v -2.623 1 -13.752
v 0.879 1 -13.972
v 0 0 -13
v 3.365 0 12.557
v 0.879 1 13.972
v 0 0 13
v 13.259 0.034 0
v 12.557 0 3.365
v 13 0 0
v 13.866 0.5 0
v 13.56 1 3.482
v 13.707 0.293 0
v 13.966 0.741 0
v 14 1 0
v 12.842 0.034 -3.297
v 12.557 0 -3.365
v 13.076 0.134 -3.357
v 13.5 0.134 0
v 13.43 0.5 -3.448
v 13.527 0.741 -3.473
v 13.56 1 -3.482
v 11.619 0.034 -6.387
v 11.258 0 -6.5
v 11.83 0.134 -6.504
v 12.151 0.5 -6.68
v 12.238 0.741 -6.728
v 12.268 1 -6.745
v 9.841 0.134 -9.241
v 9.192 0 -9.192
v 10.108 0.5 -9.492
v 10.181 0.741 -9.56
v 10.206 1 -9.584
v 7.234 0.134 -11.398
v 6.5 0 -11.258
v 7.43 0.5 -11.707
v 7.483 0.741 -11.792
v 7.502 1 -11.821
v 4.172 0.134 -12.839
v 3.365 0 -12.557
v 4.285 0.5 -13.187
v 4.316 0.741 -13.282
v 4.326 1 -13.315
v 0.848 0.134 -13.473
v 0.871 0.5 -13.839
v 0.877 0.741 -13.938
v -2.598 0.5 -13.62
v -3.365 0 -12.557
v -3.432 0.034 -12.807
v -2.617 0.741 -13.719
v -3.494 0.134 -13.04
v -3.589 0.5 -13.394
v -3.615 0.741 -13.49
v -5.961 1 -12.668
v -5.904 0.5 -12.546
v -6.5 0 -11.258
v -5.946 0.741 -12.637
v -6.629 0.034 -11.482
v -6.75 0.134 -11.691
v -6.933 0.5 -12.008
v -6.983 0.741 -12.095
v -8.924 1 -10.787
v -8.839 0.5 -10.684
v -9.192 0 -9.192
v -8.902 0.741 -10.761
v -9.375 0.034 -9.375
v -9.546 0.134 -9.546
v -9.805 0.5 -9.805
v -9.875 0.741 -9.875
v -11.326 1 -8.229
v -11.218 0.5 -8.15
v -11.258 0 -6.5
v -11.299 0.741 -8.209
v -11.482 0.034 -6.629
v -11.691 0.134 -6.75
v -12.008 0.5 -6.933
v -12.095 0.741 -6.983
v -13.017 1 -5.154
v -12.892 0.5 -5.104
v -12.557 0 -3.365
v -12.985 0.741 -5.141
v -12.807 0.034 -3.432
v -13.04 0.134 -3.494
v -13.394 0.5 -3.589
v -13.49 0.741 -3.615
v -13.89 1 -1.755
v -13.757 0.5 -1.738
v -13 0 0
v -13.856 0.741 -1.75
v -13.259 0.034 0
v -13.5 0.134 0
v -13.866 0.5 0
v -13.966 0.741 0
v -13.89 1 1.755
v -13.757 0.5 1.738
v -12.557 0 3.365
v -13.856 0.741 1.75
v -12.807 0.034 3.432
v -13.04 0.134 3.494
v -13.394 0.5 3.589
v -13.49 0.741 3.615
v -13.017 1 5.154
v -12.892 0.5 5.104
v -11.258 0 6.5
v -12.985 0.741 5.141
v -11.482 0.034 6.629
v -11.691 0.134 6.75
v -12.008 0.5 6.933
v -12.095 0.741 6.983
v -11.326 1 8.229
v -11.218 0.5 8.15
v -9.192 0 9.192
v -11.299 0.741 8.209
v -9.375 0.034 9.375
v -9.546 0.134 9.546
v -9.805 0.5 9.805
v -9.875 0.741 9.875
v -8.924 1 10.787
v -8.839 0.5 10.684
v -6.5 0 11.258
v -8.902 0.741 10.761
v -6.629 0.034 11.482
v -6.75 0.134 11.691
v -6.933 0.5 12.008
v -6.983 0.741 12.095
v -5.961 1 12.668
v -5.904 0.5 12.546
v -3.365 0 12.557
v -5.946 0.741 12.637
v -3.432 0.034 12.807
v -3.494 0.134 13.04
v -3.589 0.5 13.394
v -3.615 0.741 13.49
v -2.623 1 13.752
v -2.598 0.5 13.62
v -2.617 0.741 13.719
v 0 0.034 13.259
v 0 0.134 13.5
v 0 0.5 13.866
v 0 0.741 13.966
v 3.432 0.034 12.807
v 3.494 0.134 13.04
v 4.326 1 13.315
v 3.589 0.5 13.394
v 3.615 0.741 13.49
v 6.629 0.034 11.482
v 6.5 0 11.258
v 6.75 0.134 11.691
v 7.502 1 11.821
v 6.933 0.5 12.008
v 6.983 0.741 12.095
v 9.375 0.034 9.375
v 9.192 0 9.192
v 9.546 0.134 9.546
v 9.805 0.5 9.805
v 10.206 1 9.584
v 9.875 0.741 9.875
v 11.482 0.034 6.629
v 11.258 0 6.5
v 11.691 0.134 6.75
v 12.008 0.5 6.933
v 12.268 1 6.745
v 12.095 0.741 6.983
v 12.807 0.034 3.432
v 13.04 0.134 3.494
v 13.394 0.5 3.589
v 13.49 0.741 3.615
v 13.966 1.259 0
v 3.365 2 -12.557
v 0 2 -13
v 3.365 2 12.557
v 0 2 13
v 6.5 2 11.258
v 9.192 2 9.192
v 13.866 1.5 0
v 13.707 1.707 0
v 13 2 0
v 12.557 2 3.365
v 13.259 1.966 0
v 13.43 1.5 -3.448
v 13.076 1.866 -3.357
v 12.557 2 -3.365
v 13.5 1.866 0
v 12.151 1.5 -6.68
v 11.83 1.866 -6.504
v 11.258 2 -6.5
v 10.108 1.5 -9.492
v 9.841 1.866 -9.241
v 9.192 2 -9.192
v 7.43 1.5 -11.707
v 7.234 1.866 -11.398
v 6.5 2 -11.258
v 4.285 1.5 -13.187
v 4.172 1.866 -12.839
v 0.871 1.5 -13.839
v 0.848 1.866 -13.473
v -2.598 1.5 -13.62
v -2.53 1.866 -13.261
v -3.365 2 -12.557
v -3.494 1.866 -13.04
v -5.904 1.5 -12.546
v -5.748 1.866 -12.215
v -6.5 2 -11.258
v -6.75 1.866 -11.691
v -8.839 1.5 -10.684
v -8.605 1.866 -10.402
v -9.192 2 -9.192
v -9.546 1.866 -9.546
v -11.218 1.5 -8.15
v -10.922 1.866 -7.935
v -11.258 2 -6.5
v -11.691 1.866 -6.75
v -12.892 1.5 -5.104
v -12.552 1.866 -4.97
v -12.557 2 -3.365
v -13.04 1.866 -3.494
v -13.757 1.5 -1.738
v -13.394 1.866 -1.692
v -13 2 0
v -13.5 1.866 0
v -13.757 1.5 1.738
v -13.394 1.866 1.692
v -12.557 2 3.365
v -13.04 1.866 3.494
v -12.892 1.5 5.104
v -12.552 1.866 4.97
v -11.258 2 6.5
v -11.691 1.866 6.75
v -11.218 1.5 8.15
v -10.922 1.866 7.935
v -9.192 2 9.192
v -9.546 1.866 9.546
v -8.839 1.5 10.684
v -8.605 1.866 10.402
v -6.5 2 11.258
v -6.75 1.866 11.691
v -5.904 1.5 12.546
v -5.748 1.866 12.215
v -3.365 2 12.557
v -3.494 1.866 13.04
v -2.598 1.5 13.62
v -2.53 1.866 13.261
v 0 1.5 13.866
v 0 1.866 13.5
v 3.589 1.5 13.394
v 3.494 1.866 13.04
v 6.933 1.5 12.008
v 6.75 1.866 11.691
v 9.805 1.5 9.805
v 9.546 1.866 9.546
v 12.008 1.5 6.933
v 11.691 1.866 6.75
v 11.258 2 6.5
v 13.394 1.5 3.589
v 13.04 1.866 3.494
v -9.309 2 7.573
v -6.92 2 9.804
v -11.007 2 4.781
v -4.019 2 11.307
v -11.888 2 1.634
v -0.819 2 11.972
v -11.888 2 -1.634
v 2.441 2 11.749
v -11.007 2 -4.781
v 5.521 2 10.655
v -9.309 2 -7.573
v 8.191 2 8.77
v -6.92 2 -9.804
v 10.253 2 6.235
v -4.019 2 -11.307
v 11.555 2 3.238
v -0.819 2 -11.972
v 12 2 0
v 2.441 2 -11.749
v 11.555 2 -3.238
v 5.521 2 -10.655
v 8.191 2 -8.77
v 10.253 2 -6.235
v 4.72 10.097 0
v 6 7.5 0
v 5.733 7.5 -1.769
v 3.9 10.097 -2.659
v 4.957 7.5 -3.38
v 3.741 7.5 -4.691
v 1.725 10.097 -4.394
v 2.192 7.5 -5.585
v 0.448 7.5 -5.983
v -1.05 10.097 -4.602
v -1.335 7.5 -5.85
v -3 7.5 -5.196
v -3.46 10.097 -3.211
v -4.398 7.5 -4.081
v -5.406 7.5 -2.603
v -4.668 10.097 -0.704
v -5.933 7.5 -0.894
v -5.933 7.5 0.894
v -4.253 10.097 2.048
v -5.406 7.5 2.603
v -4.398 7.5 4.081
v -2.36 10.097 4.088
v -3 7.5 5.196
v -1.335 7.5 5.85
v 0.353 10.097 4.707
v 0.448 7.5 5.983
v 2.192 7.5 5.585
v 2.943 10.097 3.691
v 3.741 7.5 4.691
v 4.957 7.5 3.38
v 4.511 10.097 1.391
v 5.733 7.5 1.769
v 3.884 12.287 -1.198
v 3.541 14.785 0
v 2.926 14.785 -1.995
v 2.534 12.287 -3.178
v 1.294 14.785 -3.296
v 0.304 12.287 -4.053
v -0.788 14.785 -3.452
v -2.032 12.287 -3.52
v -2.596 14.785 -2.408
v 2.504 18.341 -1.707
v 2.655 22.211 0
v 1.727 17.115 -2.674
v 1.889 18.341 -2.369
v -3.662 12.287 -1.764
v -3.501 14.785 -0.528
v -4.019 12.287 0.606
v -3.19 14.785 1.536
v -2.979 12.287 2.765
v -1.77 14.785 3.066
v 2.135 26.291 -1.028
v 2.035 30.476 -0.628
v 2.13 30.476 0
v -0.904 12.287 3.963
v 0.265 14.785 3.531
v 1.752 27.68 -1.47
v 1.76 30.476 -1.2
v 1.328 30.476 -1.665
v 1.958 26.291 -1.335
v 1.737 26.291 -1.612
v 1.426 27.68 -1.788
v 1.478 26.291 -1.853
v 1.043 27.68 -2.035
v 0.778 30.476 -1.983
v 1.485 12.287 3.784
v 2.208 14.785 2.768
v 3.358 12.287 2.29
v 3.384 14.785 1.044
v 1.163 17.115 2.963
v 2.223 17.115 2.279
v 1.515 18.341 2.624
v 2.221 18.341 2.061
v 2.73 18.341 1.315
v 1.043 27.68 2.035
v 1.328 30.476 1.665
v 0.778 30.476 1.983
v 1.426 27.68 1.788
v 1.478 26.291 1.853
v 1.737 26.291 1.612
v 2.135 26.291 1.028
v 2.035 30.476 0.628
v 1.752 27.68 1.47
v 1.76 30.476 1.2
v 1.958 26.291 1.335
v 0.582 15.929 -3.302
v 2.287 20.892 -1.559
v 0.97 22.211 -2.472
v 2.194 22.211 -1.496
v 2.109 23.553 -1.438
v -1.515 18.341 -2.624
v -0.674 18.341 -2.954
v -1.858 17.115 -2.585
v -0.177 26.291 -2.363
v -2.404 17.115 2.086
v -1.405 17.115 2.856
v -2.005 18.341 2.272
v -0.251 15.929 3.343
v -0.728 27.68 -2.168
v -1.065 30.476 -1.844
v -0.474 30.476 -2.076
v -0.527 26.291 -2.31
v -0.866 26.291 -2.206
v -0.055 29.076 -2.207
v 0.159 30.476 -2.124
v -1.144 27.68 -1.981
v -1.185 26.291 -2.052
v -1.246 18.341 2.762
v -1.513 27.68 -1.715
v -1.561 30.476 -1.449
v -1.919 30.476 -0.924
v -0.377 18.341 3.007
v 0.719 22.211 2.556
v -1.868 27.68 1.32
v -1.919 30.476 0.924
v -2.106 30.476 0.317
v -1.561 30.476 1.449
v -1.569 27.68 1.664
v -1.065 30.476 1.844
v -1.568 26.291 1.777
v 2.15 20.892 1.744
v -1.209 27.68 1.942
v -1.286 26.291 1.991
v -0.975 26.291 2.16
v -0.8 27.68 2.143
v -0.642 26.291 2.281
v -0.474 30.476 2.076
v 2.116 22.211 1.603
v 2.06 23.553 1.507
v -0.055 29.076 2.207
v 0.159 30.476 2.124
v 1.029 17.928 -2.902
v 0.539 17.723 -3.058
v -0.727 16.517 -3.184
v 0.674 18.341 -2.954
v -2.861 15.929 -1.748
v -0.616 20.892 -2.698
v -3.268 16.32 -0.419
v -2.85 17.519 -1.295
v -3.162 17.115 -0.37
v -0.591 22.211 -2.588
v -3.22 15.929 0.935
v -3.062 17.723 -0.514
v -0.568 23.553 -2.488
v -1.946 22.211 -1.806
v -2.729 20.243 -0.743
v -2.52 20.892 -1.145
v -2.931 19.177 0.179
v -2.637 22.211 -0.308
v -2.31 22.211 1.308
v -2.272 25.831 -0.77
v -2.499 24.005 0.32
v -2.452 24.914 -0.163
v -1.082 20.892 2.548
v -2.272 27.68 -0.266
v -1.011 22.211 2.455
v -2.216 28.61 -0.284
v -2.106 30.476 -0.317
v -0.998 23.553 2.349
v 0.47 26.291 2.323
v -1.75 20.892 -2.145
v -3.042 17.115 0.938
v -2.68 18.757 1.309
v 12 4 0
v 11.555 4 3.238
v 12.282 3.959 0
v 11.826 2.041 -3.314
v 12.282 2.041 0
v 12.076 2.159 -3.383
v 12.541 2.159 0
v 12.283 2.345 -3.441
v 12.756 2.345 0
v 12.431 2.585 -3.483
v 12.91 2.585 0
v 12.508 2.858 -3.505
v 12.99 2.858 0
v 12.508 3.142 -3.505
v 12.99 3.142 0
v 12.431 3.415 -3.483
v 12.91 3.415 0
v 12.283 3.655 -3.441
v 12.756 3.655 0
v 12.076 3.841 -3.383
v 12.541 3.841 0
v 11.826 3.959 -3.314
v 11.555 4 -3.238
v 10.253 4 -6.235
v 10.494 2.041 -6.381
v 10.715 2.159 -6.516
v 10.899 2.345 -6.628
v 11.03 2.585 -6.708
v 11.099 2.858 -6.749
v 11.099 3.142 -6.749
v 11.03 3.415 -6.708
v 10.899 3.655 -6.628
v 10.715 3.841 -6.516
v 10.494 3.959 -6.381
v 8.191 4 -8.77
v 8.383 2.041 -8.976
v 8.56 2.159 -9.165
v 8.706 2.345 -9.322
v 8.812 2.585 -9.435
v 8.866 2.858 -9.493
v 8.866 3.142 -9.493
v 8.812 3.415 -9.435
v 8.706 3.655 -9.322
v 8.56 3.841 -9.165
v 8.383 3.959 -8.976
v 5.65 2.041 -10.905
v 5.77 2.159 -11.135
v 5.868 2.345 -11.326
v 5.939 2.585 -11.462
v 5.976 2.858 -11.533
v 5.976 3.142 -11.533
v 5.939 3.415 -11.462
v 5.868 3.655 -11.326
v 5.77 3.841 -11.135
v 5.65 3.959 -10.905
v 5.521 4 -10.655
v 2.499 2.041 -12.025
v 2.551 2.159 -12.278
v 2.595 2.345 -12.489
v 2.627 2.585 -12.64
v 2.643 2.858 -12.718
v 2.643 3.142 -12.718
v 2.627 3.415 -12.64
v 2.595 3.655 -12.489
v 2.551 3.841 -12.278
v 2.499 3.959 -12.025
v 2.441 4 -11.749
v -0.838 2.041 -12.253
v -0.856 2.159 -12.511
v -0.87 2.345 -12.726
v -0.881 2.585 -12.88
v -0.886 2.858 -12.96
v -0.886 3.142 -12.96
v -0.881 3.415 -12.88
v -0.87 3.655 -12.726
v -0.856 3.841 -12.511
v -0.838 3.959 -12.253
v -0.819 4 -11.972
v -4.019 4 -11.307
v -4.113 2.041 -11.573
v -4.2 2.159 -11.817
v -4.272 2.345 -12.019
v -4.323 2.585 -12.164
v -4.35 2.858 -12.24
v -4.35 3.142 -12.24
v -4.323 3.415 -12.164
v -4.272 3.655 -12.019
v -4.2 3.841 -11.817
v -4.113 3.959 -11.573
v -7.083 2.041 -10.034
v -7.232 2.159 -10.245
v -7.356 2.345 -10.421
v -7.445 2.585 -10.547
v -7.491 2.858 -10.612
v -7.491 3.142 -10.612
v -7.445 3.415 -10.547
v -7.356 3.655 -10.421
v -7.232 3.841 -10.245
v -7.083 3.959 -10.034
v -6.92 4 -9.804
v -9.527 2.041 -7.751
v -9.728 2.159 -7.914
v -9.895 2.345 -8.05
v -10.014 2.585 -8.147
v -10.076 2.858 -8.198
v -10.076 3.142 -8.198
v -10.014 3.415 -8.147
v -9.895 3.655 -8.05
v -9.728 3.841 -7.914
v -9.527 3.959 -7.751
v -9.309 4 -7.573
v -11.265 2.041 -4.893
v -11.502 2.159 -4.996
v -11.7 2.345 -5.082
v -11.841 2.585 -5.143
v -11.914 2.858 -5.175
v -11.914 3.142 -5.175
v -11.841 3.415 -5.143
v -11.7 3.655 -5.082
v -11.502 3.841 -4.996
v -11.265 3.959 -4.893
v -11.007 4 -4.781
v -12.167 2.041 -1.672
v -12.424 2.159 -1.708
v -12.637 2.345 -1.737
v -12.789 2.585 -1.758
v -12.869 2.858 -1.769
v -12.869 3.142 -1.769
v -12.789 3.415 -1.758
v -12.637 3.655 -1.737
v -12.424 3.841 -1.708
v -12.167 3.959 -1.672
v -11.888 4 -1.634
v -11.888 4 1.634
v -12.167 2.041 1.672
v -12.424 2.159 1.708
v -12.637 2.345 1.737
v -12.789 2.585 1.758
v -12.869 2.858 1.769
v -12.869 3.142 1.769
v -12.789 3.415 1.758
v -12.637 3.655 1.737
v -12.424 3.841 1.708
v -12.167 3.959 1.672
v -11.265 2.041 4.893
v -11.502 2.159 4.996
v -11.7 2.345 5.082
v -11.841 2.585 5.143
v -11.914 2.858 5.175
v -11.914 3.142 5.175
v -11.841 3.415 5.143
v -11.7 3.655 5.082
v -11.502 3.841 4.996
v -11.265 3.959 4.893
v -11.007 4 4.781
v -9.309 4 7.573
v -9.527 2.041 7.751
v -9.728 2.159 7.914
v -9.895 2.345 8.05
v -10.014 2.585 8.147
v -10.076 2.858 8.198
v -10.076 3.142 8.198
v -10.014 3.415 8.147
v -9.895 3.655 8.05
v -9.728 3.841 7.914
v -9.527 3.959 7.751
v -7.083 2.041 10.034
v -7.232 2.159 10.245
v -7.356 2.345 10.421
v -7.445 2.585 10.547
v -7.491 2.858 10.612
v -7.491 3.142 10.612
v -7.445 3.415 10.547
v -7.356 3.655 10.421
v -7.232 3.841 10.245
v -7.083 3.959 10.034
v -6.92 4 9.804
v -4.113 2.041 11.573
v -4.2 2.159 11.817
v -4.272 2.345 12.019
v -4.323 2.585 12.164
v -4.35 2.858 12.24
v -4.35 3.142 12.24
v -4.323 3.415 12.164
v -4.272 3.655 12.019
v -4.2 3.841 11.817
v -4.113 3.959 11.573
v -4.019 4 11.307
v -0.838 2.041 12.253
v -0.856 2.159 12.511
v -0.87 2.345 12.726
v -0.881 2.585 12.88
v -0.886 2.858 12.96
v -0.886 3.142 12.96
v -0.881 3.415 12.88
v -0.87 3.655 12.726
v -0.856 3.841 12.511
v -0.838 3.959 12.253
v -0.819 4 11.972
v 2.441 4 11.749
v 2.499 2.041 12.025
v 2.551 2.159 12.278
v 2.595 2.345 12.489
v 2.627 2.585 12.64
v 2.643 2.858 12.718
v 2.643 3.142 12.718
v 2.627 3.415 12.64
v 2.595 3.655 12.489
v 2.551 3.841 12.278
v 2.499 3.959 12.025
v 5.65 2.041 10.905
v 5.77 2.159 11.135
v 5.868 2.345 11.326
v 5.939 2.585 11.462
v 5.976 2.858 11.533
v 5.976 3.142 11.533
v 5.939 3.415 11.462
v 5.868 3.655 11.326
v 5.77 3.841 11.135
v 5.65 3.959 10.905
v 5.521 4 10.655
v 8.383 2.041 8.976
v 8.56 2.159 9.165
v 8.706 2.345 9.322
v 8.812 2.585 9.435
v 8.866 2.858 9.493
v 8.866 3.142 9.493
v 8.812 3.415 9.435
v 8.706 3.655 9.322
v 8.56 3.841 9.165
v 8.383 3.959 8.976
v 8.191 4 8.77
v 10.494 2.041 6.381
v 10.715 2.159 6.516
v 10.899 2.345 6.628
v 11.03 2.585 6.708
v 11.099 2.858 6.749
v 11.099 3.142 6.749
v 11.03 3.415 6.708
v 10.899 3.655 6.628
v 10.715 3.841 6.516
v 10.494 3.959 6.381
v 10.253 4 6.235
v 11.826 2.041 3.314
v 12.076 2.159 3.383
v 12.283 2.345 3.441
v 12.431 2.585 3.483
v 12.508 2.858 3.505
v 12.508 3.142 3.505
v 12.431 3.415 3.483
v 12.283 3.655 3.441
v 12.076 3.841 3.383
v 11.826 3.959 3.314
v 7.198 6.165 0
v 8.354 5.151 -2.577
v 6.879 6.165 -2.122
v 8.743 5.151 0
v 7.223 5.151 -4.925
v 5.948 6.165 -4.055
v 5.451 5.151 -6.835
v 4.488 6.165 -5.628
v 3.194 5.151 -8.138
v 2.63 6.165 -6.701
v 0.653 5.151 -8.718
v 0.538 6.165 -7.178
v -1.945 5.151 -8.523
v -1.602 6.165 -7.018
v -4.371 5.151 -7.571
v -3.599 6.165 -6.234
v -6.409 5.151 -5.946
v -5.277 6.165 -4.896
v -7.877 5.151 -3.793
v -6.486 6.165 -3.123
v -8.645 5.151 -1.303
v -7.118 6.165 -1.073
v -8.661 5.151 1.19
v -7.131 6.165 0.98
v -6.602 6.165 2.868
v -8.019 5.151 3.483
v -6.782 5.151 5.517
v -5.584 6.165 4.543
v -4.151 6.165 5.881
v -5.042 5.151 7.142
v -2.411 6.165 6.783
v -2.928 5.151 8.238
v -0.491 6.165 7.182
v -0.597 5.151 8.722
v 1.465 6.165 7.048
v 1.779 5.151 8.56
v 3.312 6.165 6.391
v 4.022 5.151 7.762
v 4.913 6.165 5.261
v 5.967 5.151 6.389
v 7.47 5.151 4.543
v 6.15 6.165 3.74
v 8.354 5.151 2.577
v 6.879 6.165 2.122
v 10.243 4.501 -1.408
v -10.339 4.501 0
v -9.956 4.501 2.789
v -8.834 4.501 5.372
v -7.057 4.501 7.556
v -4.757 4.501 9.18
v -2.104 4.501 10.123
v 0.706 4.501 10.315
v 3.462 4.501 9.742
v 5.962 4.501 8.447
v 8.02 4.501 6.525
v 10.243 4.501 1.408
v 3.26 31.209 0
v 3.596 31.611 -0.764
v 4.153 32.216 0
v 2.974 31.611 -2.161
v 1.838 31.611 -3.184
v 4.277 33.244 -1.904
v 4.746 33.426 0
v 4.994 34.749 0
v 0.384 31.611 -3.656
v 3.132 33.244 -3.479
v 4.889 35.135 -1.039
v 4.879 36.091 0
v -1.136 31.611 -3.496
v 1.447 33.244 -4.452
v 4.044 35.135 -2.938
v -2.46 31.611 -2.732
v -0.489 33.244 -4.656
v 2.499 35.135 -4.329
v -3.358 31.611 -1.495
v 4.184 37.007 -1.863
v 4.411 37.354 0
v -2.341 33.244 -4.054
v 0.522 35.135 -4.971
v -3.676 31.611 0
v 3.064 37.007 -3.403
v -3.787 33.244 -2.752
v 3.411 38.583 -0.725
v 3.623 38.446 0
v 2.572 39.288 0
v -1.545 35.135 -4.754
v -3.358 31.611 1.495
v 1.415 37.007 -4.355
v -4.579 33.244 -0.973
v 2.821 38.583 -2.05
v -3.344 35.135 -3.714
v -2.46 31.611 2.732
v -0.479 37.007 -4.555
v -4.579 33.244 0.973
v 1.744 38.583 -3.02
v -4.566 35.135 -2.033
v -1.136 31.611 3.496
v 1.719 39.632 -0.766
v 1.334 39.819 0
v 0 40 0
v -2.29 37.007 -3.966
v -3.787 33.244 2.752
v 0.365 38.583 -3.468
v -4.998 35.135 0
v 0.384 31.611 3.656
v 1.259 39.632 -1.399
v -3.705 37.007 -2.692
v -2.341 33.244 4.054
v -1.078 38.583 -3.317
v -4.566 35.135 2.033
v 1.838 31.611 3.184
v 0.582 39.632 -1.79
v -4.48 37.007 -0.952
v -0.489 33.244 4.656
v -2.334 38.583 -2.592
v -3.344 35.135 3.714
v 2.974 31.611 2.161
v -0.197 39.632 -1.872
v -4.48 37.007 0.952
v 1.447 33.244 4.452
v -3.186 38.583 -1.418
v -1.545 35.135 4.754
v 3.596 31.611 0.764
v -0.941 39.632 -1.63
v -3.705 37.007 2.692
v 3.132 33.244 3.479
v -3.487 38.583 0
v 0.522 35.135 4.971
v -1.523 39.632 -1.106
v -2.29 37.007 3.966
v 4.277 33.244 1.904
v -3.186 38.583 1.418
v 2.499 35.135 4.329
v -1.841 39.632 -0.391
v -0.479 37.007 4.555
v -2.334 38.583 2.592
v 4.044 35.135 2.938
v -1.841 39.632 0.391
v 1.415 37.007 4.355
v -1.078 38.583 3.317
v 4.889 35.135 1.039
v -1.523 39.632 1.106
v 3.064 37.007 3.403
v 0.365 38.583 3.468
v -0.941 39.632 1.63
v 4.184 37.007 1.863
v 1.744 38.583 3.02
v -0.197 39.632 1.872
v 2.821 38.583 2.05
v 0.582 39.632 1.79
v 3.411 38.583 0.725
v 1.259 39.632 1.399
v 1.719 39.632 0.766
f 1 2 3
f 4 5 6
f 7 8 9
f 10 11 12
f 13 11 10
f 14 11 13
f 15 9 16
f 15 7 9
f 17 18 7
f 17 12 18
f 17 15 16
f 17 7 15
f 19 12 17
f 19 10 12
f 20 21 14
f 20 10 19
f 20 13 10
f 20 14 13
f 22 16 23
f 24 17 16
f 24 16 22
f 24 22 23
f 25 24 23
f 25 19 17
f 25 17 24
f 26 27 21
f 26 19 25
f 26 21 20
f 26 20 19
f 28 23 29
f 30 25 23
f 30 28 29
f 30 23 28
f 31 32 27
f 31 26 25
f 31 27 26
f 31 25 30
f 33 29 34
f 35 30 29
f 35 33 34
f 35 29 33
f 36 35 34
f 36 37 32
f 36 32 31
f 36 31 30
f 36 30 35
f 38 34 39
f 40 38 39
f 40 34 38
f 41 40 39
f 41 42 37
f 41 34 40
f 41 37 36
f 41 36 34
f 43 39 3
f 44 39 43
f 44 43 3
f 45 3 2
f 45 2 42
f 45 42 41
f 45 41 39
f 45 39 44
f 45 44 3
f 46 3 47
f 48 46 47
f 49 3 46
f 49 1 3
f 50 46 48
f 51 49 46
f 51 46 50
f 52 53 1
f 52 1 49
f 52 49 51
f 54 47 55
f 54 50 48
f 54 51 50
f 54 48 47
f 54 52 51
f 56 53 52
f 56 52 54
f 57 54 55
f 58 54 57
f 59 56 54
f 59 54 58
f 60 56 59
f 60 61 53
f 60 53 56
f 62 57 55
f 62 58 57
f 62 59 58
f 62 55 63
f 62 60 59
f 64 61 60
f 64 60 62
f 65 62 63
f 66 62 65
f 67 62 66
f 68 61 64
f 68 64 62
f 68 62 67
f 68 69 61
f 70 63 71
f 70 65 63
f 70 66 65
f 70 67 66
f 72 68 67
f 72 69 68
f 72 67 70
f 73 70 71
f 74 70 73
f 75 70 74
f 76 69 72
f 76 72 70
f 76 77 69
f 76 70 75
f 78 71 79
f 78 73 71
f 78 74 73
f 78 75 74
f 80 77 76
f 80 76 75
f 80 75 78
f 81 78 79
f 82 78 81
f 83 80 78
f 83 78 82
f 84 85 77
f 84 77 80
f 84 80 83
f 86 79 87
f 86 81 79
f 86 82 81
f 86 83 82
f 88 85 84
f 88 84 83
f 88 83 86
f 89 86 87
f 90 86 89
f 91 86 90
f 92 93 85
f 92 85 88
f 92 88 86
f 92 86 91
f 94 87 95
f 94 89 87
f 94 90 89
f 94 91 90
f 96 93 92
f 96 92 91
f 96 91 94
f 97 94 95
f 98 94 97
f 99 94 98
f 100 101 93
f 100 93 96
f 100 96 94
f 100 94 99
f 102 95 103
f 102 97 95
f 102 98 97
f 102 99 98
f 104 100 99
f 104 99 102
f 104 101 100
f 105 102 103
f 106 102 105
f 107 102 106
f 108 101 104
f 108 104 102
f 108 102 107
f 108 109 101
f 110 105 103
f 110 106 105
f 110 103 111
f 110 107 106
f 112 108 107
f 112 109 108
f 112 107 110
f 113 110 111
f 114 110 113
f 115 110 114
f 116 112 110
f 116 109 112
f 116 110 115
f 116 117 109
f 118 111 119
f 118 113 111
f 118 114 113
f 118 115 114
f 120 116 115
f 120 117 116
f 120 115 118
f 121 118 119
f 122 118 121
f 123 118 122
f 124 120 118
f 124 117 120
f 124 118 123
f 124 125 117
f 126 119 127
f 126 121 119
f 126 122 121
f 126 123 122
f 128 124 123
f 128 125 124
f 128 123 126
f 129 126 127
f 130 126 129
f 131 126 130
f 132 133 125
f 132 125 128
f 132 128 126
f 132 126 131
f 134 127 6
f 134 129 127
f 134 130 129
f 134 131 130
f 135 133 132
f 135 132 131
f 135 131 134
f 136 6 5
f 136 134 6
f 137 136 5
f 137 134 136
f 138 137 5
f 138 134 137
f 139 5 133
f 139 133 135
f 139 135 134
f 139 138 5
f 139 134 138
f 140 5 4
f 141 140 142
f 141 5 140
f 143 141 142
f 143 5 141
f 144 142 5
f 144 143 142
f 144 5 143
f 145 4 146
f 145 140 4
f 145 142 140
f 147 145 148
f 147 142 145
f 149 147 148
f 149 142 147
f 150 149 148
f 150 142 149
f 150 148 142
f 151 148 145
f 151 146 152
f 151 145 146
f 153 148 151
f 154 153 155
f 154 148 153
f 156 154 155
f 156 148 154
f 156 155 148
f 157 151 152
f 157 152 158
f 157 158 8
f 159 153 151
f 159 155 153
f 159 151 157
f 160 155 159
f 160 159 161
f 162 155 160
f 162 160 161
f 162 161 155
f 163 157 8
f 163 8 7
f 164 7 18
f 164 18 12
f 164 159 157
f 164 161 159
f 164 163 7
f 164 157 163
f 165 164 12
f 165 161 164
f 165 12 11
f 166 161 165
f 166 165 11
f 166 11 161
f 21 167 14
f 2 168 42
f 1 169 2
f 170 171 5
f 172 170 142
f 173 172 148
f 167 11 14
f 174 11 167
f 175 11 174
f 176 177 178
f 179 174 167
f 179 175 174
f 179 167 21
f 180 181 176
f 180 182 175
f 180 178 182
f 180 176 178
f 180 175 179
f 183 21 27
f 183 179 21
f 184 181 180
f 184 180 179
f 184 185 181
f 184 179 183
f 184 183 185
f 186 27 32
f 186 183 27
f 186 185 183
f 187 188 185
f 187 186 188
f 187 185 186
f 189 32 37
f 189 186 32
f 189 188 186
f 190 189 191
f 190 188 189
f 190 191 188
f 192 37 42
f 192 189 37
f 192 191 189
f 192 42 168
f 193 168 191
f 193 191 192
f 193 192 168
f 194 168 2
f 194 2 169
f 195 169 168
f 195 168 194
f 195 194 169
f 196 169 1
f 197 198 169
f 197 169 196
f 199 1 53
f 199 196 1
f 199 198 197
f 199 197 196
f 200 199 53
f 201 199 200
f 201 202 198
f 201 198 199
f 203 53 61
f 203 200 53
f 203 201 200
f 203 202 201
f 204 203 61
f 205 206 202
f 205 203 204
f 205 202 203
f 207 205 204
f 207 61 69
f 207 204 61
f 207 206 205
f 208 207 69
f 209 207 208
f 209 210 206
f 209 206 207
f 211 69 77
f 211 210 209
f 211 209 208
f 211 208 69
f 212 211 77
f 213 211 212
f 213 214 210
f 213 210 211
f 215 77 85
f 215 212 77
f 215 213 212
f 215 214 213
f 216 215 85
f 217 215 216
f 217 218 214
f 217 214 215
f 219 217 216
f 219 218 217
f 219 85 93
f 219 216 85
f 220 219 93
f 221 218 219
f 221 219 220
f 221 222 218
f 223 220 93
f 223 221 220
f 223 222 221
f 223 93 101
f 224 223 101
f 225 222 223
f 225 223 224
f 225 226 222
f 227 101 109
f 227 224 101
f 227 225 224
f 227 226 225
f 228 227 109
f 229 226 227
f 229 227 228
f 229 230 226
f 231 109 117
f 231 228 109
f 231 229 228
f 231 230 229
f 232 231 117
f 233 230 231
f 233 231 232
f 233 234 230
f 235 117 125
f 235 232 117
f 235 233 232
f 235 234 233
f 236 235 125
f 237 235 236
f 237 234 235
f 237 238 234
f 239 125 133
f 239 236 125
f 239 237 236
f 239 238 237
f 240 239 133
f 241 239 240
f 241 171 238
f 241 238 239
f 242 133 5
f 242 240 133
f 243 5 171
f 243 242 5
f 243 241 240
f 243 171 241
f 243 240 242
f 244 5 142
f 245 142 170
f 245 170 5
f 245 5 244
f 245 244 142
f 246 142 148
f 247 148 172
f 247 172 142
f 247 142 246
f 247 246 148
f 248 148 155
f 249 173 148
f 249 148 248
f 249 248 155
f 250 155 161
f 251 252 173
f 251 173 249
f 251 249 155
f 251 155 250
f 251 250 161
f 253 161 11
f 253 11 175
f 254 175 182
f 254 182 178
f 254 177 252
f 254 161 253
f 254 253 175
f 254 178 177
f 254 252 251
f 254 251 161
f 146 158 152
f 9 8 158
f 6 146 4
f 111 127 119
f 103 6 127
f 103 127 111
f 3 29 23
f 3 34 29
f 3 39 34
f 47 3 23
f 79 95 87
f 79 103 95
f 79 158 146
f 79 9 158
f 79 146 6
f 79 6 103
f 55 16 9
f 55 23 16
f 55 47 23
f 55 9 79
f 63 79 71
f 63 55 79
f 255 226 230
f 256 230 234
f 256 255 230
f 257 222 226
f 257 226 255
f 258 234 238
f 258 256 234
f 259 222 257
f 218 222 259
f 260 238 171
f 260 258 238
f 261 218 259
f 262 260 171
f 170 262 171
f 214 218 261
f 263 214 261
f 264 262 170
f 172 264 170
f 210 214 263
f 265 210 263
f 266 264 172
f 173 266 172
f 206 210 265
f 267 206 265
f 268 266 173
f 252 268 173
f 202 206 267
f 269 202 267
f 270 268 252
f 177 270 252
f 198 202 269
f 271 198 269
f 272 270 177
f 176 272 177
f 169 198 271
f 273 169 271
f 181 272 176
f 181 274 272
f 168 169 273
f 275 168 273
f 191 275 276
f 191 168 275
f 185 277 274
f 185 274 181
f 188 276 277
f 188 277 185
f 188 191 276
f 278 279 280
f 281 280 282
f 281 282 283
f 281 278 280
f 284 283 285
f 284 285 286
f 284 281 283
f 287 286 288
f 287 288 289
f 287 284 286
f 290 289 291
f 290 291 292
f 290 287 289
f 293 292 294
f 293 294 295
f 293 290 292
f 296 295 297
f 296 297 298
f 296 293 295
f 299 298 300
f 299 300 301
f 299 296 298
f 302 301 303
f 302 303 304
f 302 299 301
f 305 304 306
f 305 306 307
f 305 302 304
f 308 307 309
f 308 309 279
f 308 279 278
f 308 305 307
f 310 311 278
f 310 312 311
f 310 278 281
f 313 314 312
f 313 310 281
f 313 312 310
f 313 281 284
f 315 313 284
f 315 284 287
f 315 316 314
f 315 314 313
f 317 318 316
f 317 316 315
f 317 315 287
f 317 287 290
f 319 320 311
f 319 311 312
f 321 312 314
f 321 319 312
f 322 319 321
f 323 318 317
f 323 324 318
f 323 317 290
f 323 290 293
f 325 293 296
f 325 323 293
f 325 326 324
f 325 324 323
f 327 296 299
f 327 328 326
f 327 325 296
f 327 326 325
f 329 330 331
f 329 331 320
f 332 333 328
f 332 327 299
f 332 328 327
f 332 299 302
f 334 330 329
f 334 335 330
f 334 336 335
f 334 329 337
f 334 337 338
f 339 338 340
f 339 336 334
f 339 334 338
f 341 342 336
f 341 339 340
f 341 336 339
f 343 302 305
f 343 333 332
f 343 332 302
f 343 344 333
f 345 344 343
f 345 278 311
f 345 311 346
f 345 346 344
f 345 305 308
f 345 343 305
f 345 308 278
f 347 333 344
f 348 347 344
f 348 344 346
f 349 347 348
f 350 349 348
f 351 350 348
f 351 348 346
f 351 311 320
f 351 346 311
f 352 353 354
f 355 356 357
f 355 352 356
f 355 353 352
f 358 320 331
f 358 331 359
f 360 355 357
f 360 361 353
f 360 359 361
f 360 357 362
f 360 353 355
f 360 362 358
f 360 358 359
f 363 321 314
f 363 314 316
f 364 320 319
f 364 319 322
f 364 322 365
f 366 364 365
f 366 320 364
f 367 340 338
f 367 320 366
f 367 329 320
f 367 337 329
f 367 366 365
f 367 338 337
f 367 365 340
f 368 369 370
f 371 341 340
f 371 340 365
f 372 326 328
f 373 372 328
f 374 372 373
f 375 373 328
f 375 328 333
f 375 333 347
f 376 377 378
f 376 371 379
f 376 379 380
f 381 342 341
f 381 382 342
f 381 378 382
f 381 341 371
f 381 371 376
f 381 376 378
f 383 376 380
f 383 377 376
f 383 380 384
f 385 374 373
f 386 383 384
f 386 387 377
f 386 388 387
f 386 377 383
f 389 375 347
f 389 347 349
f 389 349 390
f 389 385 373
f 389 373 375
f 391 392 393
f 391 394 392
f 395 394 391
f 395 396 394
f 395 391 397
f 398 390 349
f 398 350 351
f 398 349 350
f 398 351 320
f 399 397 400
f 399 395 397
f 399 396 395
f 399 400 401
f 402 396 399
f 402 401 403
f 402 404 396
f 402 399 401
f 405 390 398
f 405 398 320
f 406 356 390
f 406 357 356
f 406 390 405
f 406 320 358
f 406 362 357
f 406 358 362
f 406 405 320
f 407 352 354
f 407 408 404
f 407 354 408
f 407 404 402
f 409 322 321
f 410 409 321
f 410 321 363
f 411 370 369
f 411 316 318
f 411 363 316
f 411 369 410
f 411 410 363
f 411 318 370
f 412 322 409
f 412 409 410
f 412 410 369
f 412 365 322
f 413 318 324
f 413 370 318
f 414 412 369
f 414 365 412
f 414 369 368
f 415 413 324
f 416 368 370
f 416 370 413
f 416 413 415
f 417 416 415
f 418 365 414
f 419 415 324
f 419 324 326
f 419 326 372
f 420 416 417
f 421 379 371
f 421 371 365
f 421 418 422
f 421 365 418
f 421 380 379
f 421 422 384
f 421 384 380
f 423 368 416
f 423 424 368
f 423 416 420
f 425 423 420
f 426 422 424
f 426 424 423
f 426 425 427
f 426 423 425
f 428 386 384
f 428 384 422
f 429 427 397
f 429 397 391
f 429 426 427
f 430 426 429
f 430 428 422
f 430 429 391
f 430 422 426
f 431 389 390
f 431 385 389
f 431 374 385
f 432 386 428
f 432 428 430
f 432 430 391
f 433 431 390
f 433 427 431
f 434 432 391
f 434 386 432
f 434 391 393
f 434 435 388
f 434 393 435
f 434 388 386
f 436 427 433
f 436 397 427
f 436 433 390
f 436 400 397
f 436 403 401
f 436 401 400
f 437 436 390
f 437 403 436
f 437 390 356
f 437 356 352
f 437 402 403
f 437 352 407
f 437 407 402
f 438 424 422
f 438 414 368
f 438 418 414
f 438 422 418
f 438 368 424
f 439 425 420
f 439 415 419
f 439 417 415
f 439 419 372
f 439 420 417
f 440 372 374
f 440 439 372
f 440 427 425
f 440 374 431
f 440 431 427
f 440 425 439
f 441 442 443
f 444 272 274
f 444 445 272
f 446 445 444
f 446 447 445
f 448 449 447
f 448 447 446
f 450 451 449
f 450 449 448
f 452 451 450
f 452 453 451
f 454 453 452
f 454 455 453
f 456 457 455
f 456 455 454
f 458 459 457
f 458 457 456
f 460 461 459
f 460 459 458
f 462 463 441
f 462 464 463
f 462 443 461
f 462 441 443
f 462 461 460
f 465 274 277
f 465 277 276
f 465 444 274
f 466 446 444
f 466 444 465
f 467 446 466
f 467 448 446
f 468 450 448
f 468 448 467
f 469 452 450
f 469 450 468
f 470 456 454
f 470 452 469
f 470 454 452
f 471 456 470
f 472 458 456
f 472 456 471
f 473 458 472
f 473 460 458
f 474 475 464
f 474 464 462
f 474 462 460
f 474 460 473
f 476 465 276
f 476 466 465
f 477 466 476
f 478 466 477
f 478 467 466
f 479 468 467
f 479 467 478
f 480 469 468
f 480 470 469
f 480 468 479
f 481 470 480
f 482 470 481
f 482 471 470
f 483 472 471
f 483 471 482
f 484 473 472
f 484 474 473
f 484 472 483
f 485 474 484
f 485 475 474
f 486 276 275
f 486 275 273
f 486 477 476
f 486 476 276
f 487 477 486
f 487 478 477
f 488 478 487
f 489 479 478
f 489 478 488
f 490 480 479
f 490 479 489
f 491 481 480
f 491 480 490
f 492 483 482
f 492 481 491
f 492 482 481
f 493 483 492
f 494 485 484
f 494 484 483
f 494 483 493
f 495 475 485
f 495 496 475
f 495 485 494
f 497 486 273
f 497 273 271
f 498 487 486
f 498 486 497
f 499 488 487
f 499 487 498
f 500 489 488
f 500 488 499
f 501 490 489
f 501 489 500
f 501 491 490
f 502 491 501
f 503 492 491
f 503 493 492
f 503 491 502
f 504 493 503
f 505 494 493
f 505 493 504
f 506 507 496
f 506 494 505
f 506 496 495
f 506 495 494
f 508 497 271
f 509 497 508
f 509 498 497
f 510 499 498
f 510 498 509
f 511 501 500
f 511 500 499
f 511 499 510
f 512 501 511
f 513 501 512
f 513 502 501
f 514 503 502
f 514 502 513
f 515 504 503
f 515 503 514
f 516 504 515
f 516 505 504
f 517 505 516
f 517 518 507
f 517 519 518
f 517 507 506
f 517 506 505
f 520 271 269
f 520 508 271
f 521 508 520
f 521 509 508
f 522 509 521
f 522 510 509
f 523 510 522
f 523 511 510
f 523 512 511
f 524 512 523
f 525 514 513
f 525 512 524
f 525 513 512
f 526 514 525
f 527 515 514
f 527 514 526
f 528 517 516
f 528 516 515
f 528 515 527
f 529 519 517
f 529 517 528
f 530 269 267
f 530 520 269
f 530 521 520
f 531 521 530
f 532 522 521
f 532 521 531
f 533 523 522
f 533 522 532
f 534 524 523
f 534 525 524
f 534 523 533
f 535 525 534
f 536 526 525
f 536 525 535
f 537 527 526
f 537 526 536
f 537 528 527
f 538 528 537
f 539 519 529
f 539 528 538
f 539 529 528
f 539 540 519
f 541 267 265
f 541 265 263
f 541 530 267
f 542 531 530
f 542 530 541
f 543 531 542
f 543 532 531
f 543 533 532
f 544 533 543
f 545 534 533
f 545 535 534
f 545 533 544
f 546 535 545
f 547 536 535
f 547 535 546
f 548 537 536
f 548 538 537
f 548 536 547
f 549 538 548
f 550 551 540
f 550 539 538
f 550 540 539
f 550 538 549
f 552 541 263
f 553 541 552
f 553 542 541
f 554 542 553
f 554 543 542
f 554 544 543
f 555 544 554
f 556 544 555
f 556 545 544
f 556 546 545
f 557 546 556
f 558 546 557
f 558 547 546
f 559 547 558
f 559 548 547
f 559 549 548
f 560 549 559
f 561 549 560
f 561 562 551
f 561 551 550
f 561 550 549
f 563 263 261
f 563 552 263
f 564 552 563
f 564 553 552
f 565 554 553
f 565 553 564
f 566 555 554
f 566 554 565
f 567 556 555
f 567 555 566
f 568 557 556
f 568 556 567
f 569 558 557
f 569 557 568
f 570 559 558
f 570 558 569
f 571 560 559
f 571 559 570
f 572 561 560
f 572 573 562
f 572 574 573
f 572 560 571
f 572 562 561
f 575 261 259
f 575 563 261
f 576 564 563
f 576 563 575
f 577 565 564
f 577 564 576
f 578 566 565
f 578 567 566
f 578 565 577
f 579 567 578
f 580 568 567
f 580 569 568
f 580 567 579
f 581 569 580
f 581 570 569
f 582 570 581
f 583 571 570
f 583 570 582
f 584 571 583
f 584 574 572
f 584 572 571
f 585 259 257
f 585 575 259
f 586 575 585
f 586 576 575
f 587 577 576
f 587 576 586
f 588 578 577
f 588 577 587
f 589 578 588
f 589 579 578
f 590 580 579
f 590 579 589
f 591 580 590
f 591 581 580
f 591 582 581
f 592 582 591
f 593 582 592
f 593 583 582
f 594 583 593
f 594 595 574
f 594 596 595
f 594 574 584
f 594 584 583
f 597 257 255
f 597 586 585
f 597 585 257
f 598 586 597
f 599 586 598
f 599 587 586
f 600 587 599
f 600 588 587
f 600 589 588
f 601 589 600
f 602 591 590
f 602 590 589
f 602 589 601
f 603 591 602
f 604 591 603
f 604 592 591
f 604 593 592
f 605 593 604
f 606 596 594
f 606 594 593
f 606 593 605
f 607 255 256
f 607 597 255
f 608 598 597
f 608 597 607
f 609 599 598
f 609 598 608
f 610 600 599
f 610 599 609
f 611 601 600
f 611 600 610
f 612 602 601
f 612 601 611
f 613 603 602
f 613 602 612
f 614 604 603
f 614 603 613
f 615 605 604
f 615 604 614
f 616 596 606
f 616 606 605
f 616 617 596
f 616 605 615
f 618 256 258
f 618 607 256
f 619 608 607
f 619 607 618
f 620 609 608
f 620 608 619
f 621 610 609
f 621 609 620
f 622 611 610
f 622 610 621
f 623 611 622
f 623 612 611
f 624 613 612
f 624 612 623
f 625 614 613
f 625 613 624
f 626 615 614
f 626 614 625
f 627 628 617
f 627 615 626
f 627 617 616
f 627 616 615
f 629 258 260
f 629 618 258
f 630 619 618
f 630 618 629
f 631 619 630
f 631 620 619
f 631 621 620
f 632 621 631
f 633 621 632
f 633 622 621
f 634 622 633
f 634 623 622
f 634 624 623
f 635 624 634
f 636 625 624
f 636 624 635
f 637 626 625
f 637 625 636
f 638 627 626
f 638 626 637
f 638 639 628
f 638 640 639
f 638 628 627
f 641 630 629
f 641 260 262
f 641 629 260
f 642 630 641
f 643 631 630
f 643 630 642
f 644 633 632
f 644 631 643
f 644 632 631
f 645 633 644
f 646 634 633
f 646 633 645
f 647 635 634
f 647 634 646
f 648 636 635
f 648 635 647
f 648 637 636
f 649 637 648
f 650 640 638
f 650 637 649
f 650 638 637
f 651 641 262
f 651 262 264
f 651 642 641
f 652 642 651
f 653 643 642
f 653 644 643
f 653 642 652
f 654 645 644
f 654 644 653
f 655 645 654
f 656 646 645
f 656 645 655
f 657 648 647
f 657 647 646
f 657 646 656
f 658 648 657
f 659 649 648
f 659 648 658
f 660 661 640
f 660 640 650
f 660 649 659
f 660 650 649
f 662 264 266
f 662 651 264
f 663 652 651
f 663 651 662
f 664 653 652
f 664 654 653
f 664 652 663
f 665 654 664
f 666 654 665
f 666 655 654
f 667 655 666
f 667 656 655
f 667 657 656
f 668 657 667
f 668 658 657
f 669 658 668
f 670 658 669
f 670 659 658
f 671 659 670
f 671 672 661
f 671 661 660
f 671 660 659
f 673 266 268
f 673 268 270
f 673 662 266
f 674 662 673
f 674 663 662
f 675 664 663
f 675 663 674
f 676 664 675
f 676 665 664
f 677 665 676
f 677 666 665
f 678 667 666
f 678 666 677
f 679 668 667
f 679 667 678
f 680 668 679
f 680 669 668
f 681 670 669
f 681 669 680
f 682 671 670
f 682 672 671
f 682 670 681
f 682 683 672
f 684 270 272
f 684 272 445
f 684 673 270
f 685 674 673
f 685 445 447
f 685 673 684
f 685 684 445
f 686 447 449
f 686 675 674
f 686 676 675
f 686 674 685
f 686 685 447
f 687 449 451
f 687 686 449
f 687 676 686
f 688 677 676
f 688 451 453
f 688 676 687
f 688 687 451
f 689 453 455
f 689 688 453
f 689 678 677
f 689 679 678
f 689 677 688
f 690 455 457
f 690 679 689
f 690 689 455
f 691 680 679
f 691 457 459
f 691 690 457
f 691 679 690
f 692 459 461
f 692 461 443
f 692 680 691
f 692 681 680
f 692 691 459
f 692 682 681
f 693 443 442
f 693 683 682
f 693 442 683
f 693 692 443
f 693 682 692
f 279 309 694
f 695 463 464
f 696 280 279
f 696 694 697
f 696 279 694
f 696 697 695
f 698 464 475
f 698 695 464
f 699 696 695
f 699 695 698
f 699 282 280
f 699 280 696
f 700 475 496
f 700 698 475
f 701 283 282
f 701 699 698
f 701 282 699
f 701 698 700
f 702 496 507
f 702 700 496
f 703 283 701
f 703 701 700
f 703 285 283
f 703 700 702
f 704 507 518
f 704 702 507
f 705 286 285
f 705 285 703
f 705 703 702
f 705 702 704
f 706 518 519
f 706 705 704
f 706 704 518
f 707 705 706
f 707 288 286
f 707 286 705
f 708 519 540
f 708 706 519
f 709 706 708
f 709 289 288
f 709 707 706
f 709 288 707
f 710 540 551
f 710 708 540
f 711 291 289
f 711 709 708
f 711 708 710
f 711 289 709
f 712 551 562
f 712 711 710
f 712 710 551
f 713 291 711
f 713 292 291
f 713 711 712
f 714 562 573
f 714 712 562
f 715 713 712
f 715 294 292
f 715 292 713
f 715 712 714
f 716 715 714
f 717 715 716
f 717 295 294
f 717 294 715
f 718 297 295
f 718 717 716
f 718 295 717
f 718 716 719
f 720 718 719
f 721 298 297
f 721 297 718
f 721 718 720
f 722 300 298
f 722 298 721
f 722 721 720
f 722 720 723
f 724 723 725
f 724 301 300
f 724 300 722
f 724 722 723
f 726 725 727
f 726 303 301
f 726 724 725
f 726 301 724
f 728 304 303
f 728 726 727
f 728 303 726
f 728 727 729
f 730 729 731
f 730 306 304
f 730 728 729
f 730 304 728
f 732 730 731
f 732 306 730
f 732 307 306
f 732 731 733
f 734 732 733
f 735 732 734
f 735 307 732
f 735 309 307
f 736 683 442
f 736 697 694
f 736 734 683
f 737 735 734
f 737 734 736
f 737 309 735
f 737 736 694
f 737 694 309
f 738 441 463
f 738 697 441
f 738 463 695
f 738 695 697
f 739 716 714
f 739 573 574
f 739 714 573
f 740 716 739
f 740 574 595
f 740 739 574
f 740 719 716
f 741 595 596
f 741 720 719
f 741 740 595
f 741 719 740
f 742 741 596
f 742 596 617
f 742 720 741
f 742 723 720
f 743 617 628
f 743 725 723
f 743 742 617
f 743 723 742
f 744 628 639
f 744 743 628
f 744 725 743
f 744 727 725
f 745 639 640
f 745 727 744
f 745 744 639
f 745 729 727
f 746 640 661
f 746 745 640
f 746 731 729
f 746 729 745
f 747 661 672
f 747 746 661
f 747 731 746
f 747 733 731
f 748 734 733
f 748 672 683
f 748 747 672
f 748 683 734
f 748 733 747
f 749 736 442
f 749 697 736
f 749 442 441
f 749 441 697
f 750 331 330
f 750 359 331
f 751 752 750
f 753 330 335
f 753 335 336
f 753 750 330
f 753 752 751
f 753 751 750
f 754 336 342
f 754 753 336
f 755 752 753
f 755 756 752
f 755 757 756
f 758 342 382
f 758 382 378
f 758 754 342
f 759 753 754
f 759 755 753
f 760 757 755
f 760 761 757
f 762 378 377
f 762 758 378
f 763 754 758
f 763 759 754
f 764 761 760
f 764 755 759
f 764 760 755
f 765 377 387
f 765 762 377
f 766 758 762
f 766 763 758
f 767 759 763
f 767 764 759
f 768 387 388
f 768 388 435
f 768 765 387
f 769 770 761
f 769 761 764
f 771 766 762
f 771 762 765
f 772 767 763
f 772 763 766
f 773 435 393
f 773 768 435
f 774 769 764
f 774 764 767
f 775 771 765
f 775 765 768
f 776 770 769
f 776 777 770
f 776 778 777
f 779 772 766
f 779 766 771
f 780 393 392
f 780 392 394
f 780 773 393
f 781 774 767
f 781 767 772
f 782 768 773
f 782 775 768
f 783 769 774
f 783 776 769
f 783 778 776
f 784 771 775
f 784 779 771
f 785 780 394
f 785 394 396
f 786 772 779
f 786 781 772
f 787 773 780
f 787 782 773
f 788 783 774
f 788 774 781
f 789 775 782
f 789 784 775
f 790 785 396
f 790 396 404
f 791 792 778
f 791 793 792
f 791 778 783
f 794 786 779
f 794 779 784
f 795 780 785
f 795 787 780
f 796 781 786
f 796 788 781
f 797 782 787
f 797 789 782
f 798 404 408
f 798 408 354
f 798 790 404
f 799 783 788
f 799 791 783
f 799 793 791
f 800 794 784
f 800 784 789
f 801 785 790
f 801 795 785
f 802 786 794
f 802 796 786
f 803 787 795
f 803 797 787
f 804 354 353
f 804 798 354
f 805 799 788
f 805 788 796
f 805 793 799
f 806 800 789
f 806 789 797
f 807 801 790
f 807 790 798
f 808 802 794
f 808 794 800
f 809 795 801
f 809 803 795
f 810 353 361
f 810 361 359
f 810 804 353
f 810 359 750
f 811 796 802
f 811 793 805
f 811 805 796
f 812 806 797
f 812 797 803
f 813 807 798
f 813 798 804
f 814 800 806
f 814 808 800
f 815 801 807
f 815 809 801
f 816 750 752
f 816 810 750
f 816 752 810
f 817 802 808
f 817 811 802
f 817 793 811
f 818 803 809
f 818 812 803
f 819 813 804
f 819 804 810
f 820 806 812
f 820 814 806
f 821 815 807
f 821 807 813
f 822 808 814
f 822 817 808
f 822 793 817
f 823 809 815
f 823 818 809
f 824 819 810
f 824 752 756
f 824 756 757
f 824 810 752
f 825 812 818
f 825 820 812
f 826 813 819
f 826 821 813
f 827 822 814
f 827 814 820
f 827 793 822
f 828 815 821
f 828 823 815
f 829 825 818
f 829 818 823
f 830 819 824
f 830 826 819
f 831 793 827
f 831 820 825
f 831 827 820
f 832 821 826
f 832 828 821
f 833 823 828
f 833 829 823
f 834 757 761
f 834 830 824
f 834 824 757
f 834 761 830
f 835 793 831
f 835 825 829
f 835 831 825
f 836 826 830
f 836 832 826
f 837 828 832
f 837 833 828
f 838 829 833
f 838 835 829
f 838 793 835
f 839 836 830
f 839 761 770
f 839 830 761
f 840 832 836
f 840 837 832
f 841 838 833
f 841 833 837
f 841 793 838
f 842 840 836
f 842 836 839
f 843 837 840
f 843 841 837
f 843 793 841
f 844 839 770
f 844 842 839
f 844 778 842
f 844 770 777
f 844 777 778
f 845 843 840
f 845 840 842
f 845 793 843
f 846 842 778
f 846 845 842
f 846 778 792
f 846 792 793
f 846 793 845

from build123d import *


with BuildPart() as f1:
    # F0 (on Top) → F1 (revolve)
    with BuildSketch(Plane.XY):
        with BuildLine():
            Line((0, 7.5), (0, 0))
            Line((0, 0), (13, 0))
            ThreePointArc((13, 0), (12, 1), (13, 2))
            Line((13, 2), (12, 2))
            Line((12, 2), (12, 3))
            Line((12, 3), (12, 4))
            add(Edge.make_bspline(
                [(12, 4), (9.7712113884, 4.6342501124), (7.5424227768, 5.2685002249), (6, 7.5)],
                knots=[0, 0, 0, 0, 0.3531715555, 0.3531715555, 0.3531715555, 0.3531715555], degree=3))
            Line((6, 7.5), (0, 7.5))
        make_face()
        with BuildLine():
            Line((12, 3), (12, 2))
            ThreePointArc((12, 2), (13, 3), (12, 4))
            Line((12, 4), (12, 3))
        make_face()
        with BuildLine():
            Line((13, 1), (13, 0))
            ThreePointArc((13, 0), (13.7071067812, 0.2928932188), (14, 1))
            ThreePointArc((14, 1), (13.7071067812, 1.7071067812), (13, 2))
            Line((13, 2), (13, 1))
        make_face()
        with BuildLine():
            ThreePointArc((13, 2), (12, 1), (13, 0))
            Line((13, 0), (13, 1))
            Line((13, 1), (13, 2))
        make_face()
        with BuildLine():
            Line((0, 15), (0, 7.5))
            Line((0, 7.5), (6, 7.5))
            add(Edge.make_bspline(
                [(6, 7.5), (3.1750756535, 11.5869586076), (2.6524541044, 21.0316319788), (2.1298325553, 30.47630535)],
                knots=[0.3531715555, 0.3531715555, 0.3531715555, 0.3531715555, 1, 1, 1, 1], degree=3))
            ThreePointArc((2.1298325553, 30.47630535), (4.879470937, 36.0912210477), (0, 40))
            Line((0, 40), (0, 35))
            Line((0, 35), (0, 15))
        make_face()
    revolve(axis=Axis((0, 25, 0), (0, 1, 0)))


solid = f1.part
